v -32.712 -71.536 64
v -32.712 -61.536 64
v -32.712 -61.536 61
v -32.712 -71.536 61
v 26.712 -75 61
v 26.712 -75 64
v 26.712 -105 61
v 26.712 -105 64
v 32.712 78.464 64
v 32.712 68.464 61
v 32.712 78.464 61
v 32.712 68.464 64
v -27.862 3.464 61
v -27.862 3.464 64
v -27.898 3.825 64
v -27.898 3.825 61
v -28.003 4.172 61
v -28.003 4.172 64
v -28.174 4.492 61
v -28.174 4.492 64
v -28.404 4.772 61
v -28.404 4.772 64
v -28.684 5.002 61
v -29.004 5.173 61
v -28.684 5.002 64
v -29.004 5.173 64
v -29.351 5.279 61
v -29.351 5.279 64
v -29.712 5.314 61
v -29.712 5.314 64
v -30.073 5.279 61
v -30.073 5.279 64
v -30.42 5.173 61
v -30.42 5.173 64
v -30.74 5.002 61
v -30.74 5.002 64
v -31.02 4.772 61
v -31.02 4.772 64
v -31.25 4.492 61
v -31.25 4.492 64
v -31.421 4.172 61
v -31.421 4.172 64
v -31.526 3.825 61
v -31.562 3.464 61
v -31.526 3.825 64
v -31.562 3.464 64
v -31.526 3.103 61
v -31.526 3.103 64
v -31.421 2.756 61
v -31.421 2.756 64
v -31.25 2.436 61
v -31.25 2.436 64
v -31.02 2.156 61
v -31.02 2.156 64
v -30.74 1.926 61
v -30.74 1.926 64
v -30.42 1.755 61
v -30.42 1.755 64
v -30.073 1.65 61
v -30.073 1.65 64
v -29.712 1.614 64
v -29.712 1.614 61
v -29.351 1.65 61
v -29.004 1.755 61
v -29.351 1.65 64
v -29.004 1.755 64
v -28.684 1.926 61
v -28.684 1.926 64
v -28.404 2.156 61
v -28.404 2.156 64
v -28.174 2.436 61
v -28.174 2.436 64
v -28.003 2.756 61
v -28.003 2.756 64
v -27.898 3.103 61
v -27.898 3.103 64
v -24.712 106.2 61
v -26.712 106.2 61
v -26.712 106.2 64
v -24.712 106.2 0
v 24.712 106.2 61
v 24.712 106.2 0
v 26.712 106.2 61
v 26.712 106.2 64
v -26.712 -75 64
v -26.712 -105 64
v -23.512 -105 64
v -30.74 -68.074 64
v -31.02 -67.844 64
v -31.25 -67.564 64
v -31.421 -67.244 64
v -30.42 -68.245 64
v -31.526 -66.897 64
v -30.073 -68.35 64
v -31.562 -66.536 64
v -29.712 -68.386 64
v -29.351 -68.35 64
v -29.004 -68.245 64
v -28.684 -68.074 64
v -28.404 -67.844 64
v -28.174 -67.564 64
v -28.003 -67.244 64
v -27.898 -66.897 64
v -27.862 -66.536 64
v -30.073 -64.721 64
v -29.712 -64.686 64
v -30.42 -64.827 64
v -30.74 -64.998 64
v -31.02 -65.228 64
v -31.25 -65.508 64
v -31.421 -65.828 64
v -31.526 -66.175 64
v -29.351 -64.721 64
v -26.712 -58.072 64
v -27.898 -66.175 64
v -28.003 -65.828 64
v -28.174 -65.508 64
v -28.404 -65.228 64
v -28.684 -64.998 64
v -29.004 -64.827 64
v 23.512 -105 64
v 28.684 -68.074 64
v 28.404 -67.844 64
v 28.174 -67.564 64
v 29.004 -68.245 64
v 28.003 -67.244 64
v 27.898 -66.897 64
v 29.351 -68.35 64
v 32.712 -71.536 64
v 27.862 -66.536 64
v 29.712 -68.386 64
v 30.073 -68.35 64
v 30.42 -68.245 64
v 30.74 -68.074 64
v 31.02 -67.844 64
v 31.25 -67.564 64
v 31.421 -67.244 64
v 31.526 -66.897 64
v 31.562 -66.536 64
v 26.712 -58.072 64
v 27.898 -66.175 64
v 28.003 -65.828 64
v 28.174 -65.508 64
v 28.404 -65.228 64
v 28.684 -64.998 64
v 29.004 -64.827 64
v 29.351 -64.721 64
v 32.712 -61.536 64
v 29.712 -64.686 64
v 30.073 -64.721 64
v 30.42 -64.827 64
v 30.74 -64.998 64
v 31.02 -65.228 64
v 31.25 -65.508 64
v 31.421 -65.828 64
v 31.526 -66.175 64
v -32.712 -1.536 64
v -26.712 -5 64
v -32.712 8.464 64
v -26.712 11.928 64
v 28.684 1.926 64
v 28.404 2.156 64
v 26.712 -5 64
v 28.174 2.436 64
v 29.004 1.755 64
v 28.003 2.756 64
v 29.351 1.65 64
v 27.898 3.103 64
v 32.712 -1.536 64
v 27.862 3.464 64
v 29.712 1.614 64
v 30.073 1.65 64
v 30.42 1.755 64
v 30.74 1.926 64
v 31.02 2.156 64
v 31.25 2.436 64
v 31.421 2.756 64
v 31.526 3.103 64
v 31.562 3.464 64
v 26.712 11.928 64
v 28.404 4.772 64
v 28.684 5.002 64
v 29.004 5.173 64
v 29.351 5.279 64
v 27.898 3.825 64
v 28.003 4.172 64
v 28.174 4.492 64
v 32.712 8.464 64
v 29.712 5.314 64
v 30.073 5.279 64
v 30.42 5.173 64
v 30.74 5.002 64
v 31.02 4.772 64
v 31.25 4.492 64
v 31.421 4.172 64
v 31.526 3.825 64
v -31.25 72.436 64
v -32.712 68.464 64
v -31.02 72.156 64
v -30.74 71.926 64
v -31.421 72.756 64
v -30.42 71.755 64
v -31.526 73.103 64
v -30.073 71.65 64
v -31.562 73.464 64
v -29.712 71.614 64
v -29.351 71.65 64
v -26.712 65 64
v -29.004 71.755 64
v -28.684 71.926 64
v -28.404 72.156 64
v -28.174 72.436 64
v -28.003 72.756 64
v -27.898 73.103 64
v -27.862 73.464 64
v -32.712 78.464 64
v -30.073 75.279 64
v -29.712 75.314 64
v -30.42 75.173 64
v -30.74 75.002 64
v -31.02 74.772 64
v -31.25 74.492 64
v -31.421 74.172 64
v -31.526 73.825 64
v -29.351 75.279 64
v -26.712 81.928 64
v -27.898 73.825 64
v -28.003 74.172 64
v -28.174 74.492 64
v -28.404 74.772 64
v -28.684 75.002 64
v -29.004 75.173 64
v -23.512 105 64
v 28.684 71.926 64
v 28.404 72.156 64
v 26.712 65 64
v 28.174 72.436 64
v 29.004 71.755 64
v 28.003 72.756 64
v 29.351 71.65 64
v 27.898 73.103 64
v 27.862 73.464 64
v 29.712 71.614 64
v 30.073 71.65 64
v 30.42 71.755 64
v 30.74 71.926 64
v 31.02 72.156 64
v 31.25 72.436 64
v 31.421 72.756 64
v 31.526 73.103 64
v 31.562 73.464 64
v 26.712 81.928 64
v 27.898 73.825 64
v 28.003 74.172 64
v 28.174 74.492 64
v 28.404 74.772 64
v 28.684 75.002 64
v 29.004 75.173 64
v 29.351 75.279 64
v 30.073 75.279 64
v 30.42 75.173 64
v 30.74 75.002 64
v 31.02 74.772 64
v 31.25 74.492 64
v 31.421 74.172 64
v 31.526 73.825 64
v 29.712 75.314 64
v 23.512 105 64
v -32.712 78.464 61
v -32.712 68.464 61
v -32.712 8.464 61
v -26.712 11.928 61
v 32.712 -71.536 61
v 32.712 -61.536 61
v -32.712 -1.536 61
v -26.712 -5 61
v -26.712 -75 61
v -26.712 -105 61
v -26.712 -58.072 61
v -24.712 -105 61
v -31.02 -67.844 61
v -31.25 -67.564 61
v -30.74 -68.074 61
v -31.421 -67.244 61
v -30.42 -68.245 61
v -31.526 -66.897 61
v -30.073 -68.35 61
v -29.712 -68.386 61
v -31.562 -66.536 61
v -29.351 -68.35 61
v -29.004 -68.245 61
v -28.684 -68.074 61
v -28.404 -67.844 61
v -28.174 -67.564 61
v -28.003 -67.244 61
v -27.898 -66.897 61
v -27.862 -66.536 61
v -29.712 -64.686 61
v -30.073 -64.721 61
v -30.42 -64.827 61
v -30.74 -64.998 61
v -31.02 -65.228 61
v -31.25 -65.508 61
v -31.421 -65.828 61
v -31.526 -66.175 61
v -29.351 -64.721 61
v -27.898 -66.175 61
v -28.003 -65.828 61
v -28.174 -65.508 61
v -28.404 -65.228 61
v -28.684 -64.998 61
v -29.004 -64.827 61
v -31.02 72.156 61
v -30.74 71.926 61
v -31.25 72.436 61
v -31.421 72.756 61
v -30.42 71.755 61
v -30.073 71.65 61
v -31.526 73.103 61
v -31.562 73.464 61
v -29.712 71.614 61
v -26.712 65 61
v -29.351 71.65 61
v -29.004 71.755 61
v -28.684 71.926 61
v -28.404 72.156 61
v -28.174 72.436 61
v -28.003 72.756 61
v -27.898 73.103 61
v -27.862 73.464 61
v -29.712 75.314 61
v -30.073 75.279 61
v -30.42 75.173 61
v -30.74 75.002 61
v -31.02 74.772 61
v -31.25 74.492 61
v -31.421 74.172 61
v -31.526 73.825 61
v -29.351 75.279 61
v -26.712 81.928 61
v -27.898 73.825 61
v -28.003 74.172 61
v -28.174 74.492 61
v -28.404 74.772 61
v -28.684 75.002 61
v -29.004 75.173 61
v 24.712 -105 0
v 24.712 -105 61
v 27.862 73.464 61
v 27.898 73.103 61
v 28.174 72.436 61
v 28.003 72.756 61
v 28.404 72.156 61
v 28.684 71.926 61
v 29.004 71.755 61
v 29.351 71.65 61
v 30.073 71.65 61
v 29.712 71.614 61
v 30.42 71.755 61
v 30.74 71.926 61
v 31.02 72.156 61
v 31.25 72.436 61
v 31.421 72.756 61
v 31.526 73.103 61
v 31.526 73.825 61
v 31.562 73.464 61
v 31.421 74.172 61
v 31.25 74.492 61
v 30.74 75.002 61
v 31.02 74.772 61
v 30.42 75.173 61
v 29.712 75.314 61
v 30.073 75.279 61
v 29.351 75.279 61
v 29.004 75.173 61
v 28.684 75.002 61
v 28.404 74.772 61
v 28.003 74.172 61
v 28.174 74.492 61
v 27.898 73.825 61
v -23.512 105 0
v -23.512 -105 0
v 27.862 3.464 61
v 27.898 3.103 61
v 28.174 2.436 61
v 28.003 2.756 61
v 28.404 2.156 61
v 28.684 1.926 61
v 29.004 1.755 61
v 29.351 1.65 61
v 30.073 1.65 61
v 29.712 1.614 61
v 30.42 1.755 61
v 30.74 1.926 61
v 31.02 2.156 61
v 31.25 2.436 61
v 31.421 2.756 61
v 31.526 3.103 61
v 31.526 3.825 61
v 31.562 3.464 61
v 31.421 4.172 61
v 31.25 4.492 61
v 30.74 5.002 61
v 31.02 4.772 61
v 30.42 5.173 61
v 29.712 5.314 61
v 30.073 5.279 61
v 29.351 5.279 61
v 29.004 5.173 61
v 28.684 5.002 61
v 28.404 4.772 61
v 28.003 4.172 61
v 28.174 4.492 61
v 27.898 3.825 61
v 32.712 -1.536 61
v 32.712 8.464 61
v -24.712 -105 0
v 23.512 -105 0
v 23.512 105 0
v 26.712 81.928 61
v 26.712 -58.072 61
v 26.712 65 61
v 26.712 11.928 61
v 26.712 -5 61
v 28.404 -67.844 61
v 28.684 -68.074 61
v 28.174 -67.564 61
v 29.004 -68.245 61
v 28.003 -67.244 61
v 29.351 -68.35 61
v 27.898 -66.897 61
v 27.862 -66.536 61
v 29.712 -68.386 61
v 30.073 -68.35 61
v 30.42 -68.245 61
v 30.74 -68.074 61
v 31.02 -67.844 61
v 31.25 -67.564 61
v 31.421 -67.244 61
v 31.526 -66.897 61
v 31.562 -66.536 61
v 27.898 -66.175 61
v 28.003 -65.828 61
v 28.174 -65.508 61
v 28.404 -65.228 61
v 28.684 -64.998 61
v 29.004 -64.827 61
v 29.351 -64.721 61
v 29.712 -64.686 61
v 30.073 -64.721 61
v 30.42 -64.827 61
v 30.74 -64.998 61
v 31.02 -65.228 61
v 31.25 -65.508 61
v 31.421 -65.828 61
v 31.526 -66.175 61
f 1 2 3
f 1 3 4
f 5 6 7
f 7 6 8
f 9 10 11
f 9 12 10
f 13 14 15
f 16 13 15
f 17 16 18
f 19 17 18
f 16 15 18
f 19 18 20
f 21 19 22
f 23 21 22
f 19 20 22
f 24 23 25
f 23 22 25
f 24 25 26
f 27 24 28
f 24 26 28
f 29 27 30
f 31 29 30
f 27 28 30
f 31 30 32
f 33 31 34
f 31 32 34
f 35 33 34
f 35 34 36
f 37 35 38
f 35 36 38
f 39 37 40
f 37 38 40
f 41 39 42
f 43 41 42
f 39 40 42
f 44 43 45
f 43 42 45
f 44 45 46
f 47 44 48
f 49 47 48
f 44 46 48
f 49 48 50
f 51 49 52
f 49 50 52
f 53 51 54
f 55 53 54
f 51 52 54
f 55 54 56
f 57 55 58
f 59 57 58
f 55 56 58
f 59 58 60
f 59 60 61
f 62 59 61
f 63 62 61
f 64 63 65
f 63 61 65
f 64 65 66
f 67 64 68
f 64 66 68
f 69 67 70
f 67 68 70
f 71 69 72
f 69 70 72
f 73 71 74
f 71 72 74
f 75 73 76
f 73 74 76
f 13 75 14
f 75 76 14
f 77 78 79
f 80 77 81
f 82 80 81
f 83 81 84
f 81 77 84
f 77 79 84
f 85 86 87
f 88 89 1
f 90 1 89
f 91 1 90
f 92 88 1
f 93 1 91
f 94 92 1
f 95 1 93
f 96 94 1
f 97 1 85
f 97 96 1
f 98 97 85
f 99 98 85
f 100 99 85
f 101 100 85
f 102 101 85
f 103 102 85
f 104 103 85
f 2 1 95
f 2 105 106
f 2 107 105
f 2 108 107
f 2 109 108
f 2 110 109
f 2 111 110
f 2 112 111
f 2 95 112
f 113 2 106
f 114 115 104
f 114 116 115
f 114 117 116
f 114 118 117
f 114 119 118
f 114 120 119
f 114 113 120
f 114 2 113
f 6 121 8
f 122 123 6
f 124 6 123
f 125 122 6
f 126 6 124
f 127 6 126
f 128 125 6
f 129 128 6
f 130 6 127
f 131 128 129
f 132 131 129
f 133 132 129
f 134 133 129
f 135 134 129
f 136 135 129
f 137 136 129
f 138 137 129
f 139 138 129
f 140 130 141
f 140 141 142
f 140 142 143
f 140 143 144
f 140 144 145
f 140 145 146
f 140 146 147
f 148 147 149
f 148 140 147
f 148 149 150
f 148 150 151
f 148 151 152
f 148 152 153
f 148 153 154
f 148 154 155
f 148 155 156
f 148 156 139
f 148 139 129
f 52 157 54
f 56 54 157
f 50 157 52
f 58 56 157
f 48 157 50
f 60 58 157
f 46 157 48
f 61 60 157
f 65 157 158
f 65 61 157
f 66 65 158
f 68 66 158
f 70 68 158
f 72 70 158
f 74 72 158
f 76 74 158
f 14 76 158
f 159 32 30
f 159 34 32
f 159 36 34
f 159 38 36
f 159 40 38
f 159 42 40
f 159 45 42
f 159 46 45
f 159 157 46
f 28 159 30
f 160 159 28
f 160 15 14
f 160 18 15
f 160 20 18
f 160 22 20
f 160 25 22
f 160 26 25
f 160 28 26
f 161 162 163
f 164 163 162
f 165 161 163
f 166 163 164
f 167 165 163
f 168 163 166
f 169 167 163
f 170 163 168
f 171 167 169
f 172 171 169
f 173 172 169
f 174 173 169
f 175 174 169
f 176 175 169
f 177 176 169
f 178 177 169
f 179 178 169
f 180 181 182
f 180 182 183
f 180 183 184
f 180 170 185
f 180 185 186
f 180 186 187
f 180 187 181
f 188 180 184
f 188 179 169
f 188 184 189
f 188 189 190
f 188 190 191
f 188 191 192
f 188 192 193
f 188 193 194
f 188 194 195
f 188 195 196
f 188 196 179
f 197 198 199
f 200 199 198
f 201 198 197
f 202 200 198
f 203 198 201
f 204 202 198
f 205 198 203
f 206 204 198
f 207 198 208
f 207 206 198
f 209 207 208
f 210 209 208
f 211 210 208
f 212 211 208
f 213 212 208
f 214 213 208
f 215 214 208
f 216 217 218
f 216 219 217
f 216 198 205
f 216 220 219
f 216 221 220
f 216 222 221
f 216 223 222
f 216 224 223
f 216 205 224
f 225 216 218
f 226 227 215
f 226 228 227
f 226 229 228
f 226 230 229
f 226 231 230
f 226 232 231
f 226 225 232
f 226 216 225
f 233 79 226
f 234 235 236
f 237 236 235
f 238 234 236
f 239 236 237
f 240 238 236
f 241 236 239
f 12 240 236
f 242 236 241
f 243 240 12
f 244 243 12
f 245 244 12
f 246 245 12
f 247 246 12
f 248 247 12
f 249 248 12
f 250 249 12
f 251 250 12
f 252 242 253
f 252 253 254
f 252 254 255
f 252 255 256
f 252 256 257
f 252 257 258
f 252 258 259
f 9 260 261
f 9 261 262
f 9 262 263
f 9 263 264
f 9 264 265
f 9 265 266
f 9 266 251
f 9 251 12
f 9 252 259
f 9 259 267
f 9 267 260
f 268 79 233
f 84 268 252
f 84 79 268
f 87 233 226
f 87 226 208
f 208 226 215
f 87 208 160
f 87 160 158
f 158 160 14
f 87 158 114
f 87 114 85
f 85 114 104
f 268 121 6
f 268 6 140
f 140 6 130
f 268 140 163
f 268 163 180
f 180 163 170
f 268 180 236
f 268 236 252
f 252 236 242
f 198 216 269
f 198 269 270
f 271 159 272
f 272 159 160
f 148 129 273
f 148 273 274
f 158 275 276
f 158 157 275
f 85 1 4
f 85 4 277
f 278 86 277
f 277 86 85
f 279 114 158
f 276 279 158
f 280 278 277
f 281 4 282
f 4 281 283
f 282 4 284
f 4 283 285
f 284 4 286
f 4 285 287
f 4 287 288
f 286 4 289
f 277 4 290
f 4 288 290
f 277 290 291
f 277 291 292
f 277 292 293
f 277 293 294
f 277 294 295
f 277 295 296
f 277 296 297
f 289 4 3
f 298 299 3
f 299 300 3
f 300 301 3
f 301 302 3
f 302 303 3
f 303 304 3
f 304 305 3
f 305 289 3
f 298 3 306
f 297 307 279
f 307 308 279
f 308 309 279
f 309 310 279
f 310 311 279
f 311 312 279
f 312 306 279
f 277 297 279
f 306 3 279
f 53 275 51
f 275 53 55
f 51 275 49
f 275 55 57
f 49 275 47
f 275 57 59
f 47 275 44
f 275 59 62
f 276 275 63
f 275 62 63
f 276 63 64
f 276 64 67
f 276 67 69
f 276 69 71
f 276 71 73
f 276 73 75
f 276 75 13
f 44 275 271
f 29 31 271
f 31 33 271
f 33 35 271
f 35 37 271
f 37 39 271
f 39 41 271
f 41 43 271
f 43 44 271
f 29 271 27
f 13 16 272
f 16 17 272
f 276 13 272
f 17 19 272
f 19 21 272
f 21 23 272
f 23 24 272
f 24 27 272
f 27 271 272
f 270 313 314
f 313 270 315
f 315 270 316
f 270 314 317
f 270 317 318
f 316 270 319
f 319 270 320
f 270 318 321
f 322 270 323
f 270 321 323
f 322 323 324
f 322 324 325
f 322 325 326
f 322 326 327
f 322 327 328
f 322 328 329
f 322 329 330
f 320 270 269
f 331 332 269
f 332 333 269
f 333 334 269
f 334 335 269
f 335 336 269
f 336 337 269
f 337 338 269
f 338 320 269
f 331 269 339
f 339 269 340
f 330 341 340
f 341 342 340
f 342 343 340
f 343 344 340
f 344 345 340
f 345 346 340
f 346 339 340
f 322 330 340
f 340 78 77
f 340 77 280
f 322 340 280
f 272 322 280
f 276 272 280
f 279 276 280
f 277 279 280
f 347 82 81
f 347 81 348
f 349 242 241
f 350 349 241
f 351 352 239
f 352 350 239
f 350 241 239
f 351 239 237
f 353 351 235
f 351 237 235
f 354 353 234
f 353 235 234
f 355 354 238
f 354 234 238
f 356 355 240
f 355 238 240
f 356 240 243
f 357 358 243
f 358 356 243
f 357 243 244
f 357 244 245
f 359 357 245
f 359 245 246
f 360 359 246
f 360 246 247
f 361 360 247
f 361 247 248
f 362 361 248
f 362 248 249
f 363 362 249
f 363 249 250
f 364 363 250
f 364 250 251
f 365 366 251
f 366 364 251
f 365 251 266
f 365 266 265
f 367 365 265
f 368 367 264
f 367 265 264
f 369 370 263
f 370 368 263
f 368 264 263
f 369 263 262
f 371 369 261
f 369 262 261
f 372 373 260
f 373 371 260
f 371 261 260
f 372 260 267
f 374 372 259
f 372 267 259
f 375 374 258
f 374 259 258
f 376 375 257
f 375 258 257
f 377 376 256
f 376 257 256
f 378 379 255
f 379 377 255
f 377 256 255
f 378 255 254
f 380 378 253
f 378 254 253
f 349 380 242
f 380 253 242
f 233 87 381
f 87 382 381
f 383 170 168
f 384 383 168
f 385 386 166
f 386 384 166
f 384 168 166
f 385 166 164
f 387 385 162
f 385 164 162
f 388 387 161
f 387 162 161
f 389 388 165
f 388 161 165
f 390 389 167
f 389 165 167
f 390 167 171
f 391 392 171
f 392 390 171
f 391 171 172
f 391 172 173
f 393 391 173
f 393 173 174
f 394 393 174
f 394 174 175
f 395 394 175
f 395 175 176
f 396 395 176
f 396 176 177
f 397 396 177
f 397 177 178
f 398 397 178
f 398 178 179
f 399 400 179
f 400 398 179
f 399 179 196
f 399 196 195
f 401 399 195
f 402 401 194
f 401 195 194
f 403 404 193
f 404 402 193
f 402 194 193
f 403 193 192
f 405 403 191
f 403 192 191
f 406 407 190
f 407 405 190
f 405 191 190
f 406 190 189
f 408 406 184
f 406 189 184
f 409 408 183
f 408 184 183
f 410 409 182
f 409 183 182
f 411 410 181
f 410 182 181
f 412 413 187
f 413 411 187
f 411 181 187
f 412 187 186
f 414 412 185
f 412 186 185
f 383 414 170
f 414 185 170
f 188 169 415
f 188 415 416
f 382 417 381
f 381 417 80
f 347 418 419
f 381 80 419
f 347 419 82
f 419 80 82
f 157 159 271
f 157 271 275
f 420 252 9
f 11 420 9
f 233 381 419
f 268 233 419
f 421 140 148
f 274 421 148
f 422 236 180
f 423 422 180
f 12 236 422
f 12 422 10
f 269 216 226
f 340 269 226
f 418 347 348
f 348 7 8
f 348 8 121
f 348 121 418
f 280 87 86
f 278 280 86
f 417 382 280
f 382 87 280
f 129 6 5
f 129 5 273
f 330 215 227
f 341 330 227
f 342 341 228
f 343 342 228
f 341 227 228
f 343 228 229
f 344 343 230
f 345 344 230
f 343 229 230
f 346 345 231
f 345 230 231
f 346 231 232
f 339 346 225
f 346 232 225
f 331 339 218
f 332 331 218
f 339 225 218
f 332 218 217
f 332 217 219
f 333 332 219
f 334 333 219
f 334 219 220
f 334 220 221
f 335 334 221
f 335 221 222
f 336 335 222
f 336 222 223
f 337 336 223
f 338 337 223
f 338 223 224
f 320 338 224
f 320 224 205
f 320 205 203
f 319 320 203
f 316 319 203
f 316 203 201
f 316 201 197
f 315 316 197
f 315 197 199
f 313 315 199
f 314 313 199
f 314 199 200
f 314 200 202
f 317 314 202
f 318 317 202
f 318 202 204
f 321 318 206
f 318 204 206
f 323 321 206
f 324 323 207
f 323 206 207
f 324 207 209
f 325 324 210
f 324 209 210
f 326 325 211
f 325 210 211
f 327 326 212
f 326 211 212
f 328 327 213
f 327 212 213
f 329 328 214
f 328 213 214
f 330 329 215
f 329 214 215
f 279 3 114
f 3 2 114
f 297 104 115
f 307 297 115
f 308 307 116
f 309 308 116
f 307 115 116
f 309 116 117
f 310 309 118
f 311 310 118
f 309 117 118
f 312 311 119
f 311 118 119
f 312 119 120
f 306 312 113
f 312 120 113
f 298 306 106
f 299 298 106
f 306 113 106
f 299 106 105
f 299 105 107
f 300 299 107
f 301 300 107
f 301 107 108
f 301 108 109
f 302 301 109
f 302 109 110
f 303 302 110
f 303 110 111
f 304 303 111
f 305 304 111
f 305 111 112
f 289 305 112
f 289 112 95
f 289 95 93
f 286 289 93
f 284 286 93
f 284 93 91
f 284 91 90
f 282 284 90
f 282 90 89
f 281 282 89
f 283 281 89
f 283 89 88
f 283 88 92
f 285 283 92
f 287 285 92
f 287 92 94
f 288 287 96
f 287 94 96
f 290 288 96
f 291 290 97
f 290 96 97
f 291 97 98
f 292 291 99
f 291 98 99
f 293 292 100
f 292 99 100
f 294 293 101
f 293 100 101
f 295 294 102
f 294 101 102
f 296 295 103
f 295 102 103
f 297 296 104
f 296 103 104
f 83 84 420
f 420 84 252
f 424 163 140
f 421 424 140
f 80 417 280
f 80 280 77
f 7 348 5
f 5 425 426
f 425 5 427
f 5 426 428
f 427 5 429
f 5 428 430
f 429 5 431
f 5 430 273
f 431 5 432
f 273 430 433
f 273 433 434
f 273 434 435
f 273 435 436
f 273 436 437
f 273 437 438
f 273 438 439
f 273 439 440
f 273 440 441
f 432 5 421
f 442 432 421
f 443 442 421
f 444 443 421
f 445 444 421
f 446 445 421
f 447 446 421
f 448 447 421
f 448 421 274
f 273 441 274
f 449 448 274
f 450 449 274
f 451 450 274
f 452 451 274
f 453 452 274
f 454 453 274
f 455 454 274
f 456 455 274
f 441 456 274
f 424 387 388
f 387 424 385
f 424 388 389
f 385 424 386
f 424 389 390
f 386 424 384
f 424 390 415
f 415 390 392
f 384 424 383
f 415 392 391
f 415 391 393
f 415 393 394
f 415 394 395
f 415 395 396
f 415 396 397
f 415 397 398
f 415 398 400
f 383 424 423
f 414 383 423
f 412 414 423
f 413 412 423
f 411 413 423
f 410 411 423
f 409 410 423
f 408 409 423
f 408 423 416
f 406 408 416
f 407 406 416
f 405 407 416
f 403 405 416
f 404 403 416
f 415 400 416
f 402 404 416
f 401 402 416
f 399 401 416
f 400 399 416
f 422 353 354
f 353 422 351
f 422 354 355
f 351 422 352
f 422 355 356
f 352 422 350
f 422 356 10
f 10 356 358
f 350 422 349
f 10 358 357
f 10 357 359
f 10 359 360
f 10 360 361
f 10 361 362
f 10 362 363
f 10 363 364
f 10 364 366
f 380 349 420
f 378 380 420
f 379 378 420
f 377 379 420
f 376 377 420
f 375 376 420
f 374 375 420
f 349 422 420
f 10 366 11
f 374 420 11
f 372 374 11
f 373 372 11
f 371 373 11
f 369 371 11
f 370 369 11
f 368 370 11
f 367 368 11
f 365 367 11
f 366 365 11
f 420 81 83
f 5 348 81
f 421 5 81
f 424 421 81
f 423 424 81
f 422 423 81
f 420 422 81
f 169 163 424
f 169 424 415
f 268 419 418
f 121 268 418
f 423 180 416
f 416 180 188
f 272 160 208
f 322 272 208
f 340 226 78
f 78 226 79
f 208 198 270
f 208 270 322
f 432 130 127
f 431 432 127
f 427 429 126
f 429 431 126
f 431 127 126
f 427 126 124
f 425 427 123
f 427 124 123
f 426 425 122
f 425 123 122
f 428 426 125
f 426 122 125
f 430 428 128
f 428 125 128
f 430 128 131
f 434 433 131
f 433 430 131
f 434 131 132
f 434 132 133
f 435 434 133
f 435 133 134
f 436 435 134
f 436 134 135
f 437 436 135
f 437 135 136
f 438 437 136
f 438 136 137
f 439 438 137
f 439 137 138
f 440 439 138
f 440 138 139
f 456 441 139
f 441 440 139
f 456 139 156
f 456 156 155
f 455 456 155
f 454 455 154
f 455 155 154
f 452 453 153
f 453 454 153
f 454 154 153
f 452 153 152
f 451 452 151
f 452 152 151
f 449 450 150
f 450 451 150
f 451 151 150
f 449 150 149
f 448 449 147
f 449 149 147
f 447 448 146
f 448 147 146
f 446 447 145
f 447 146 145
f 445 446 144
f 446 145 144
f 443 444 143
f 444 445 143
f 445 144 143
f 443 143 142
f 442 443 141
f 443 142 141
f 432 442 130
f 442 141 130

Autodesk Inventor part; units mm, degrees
ref_plane "YZ Plane" through (0, 0, 0) normal (1, 0, 0) x (0, 1, 0)
ref_plane "XZ Plane" through (0, 0, 0) normal (0, 1, 0) x (-1, 0, 0)
ref_plane "XY Plane" through (0, 0, 0) normal (0, 0, 1) x (1, 0, 0)
sketch "Sketch1" plane through (0, 0, 0) normal (0, 0, 1) x (1, 0, 0)
  line L0 (-23.512, 105) -> (23.512, 105)
  line L1 (23.512, 105) -> (23.512, -105)
  line L2 (23.512, -105) -> (-23.512, -105)
  line L3 (-23.512, -105) -> (-23.512, 105)
  line L4 (-23.512, 105) -> (23.512, -105) construction
  line L5 (23.512, 105) -> (-23.512, -105) construction
  line L6 (-24.712, 106.2) -> (24.712, 106.2)
  line L7 (24.712, 106.2) -> (24.712, -106.2)
  line L8 (24.712, -106.2) -> (-24.712, -106.2)
  line L9 (-24.712, -106.2) -> (-24.712, 106.2)
  line L10 (-24.712, 106.2) -> (24.712, -106.2) construction
  line L11 (24.712, 106.2) -> (-24.712, -106.2) construction
  line L12 (23.512, -105) -> (24.712, -105)
  line L13 (-23.512, -105) -> (-24.712, -105)
  point P0 (0, 0)
  dimension "d0" = 47.024
  dimension "d1" = 210
  dimension "d2" = 1.2
  dimension "d3" = 1.2
extrude "Extrusion1" add sketch "Sketch1" along normal blind 64 contours L3 L13 L9 L6 L7 L12 L1 L0
sketch "Sketch2" plane through (0, 0, 64) normal (0, 0, 1) x (1, 0, 0)
  line L0 (23.512, -105) -> (24.712, -105) projected
  line L1 (24.712, -105) -> (24.712, 106.2) projected
  line L2 (24.712, 106.2) -> (-24.712, 106.2) projected
  line L3 (-24.712, 106.2) -> (-24.712, -105) projected
  line L4 (-24.712, -105) -> (-23.512, -105) projected
  line L5 (-23.512, -105) -> (-23.512, 105) projected
  line L6 (-23.512, 105) -> (23.512, 105) projected
  line L7 (23.512, 105) -> (23.512, -105) projected
  circle A0 centre (-29.712, -66.5359) radius 1.85
  line L8 (-24.712, -105) -> (-26.712, -105)
  line L9 (-26.712, -105) -> (-26.712, -75)
  line L10 (-32.712, -61.5359) -> (-32.712, -71.5359)
  line L11 (-32.712, -71.5359) -> (-26.712, -75)
  line L12 (-32.712, -61.5359) -> (-26.712, -58.0718)
  line L13 (-26.712, -75) -> (-26.712, -58.0718) construction
  line L14 (-32.712, 8.4641) -> (-26.712, 11.9282)
  line L15 (-32.712, 8.4641) -> (-32.712, -1.5359)
  line L16 (-32.712, -1.5359) -> (-26.712, -5)
  line L17 (-26.712, -5) -> (-26.712, 11.9282) construction
  circle A1 centre (-29.712, 3.4641) radius 1.85
  line L18 (-32.712, 78.4641) -> (-26.712, 81.9282)
  line L19 (-32.712, 78.4641) -> (-32.712, 68.4641)
  line L20 (-32.712, 68.4641) -> (-26.712, 65)
  line L21 (-26.712, 65) -> (-26.712, 81.9282) construction
  circle A2 centre (-29.712, 73.4641) radius 1.85
  line L22 (-26.712, -58.0718) -> (-26.712, -5)
  line L23 (-26.712, 11.9282) -> (-26.712, 65)
  line L24 (-26.712, 81.9282) -> (-26.712, 106.2)
  line L25 (-26.712, 106.2) -> (-24.712, 106.2)
  point P0 (0, 0)
  point P1 (-32.712, -66.5359)
  point P2 (-32.712, 3.4641)
  point P3 (-32.712, 73.4641)
  dimension "d6" = 3.7
  dimension "d7" = 5
  dimension "d8" = 3
  dimension "d9" = 10
  dimension "d10" = 60
  dimension "d11" = 60
  dimension "d12" = 30
  dimension "d13" = 2
  dimension "d16" = 70
extrude "Extrusion2" add sketch "Sketch2" against normal blind 3 contours L3 L8 L9 L11 L10 L12 L22 L16 L15 L14 L23 L20 L19 L18 L24 L25
mirror "Mirror1" about plane through (0, 0, 0) normal (1, 0, 0) of "Extrusion2"
equation "\"d3\" = d2"
equation "\"d11\" = d10"
properties part number "Drag Chain Cover" material "ABS Plastic"
